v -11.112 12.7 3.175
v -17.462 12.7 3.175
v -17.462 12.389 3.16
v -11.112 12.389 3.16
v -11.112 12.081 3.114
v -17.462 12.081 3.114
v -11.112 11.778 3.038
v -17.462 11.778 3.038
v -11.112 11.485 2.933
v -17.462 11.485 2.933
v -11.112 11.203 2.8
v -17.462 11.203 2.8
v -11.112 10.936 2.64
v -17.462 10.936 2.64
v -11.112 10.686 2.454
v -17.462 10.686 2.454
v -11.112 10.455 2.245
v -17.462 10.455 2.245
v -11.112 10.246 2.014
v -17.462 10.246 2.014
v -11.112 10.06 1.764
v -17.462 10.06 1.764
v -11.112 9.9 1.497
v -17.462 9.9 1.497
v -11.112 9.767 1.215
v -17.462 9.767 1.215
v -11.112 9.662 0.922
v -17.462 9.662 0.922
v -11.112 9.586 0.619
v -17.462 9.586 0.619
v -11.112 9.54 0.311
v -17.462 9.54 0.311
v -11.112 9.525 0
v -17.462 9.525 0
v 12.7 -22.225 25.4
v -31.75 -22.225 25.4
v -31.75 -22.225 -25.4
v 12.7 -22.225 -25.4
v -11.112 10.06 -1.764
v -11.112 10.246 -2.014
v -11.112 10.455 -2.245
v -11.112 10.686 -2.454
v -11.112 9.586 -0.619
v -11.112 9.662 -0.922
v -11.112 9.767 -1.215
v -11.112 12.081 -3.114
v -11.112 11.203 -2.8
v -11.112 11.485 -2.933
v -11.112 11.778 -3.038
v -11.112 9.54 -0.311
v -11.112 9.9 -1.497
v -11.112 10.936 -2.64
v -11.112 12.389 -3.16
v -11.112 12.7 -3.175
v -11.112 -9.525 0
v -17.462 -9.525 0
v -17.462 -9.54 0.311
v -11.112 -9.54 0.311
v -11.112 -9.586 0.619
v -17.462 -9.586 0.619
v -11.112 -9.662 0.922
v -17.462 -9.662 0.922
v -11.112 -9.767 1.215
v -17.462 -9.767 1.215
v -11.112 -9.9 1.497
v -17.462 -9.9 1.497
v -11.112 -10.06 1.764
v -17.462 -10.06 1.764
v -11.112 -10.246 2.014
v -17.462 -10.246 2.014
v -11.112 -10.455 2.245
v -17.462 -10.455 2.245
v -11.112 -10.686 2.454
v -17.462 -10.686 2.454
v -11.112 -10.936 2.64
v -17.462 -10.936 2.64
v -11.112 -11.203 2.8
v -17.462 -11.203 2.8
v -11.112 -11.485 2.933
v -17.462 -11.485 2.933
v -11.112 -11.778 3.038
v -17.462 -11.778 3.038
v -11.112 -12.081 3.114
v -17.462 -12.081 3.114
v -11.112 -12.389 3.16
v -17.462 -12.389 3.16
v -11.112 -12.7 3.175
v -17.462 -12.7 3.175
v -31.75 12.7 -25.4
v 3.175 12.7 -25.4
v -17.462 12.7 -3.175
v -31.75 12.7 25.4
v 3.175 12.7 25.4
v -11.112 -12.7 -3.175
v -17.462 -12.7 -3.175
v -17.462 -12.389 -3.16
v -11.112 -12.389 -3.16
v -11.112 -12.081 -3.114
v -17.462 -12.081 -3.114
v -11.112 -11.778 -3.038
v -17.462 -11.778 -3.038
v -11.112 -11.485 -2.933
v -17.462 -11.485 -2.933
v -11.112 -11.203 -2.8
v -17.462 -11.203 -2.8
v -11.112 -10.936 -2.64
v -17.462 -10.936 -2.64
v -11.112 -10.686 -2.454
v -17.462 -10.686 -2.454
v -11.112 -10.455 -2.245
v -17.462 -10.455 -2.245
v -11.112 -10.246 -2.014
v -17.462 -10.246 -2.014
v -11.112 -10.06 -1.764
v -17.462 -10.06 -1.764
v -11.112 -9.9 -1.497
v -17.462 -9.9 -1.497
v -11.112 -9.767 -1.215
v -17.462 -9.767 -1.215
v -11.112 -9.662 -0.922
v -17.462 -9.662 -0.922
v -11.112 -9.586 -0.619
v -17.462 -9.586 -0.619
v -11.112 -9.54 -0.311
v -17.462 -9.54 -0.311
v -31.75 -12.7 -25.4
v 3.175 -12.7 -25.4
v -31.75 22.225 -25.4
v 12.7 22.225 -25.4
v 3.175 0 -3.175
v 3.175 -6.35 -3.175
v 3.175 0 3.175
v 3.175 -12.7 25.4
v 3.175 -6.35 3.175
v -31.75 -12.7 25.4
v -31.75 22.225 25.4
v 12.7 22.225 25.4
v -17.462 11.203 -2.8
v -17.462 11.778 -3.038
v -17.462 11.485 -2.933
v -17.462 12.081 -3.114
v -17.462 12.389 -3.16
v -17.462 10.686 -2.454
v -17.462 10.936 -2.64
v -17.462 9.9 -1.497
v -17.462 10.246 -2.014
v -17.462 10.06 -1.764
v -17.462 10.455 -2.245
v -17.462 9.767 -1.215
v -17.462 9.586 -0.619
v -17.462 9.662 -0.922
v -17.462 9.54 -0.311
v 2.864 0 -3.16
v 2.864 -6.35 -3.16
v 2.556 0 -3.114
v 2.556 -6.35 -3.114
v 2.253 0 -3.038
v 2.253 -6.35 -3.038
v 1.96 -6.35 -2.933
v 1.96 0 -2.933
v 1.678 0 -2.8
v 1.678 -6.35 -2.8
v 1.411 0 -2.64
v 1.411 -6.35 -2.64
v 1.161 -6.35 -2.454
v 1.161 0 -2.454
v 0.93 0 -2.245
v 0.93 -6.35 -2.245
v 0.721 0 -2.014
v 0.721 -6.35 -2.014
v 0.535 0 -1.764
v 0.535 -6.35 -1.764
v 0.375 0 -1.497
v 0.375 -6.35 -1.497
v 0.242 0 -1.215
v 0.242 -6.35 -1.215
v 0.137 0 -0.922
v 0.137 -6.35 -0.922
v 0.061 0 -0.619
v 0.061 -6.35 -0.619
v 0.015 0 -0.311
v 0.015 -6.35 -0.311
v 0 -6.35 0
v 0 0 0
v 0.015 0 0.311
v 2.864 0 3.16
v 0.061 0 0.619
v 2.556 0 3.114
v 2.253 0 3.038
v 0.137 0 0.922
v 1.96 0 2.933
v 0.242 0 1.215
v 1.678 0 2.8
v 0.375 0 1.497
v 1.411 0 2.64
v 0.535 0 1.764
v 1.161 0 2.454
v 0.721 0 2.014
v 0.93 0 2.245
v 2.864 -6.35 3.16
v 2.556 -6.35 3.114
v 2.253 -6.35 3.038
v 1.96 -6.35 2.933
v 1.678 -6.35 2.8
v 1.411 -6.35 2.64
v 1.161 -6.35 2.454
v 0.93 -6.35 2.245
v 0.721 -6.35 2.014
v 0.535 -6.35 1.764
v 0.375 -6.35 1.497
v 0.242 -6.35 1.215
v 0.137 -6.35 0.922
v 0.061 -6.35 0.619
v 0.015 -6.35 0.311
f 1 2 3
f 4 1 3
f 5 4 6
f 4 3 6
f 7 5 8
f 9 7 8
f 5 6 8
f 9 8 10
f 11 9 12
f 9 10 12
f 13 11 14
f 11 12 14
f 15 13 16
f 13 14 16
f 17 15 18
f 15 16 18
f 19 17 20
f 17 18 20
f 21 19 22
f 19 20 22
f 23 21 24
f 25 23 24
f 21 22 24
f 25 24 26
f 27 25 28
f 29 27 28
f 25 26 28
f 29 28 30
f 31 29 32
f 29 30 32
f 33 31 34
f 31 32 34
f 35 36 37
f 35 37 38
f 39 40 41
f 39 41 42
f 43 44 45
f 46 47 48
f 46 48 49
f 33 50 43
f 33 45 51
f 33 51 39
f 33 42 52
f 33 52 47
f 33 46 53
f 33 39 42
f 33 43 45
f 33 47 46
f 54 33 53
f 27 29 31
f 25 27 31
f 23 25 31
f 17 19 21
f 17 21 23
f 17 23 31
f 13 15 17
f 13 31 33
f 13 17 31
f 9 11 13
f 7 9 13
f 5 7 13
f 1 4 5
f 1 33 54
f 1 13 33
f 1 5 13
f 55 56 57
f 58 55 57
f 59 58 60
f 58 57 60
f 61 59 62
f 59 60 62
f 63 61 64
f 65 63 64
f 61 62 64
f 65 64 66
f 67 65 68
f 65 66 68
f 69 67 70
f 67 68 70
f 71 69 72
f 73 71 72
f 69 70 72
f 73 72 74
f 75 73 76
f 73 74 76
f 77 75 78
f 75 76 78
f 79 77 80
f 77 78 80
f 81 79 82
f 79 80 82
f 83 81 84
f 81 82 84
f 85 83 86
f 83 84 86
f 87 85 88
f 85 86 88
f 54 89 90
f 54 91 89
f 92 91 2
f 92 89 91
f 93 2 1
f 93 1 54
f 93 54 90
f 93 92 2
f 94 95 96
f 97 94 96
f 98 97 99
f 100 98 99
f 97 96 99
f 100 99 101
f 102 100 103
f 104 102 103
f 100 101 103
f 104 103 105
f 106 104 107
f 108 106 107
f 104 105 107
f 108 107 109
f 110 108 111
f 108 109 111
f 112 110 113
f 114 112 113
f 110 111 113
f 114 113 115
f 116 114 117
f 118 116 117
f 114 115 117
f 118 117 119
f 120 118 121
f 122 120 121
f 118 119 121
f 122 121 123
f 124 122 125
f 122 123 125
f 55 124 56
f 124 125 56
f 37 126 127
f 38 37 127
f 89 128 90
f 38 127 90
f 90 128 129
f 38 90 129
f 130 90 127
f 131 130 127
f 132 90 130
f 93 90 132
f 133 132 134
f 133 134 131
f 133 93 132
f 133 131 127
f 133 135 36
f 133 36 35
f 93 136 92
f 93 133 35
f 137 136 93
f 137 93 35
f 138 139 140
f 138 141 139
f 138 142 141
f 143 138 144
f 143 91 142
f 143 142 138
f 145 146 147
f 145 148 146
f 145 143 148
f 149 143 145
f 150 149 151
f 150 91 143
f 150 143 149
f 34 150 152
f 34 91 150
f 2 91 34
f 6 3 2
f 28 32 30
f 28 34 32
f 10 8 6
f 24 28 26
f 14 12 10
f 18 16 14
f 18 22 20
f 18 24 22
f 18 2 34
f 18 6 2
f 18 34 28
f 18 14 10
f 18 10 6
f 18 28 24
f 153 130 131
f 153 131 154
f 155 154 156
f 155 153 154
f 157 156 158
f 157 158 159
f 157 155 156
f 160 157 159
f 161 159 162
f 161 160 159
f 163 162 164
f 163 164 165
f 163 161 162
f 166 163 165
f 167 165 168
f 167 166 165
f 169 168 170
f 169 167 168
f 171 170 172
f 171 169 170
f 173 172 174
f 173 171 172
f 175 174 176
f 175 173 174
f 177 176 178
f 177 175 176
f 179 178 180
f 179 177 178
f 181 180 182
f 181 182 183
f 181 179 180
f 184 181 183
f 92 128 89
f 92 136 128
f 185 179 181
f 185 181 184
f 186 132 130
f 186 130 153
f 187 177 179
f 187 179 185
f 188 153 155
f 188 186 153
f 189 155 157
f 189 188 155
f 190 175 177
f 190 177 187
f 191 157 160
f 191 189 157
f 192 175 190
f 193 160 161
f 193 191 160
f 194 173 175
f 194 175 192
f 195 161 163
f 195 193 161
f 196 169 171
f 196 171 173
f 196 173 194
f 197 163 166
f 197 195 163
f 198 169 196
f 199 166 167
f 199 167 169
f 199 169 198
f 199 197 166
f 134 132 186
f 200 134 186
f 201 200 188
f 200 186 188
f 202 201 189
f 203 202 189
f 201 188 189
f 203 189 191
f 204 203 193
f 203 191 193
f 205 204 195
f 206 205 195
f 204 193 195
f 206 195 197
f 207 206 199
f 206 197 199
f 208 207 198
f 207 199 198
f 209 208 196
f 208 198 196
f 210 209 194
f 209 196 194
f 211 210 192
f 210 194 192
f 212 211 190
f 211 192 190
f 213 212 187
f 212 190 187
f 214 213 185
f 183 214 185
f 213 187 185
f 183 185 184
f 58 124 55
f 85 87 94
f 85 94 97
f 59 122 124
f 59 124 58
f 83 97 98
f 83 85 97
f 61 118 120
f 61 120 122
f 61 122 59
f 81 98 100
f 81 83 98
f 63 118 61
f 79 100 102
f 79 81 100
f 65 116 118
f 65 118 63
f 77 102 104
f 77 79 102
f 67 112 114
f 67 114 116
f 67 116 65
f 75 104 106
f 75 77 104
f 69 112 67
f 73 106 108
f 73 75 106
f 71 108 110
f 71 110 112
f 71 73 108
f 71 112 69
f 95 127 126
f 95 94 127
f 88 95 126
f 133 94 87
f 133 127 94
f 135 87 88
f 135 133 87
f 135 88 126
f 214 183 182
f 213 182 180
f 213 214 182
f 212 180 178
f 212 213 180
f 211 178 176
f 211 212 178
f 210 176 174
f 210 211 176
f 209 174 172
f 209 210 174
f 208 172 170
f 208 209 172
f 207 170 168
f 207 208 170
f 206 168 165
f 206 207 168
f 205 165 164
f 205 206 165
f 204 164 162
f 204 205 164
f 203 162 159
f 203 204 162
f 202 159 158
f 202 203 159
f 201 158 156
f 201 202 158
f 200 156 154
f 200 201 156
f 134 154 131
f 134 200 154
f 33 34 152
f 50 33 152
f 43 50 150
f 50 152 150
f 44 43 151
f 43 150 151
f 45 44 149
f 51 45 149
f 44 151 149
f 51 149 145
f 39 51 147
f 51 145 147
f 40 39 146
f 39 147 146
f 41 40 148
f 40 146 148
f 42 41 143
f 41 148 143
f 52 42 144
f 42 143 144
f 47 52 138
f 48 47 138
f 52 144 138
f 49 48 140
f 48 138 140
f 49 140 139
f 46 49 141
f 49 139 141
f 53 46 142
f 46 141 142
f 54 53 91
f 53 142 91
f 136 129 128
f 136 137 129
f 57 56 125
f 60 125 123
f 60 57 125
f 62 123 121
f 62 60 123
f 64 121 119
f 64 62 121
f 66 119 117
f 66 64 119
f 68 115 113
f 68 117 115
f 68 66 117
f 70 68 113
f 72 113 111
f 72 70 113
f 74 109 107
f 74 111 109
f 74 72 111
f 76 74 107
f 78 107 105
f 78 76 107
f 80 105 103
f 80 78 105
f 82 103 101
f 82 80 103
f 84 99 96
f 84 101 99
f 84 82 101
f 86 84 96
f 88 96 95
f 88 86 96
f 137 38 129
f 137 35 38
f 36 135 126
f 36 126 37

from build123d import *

# Parameters (mm, degrees)
BOSS_EXTRUDE1_DEPTH = 25.4
CUT_EXTRUDE1_DEPTH  = 6.35
CUT_EXTRUDE2_DEPTH  = 6.35


with BuildPart() as part:
    # Sketch1 → Boss-Extrude1 (new body, symmetric)
    with BuildSketch(Plane.XY):
        Polygon((-31.75, 22.225), (-31.75, 12.7), (-17.4625, 12.7), (-17.4625, 9.525), (-11.1125, 9.525), (-11.1125, 12.7), (3.175, 12.7), (3.175, 0), (0, 0), (0, -6.35), (3.175, -6.35), (3.175, -12.7), (-11.1125, -12.7), (-11.1125, -9.525), (-17.4625, -9.525), (-17.4625, -12.7), (-31.75, -12.7), (-31.75, -22.225), (12.7, -22.225), (12.7, 22.225), align=None)
    extrude(amount=BOSS_EXTRUDE1_DEPTH, both=True)

    # Sketch2 → Cut-Extrude1 (cut)
    with BuildSketch(Plane.ZY.offset(17.4625)):
        with BuildLine():
            ThreePointArc((3.175, 12.7), (2.245064024, 10.454935963), (-1.9e-08, 9.525))
            Line((-1.9e-08, 9.525), (25.4, 9.525))
            Line((25.4, 9.525), (25.4, 12.7))
            Line((25.4, 12.7), (3.175, 12.7))
        make_face()
        with BuildLine():
            Line((-3.175, 12.7), (-25.4, 12.7))
            Line((-25.4, 12.7), (-25.4, 9.525))
            Line((-25.4, 9.525), (-1.9e-08, 9.525))
            ThreePointArc((-1.9e-08, 9.525), (-2.245064037, 10.454935976), (-3.175, 12.7))
        make_face()
        with BuildLine():
            Line((-2e-09, -9.525), (-25.4, -9.525))
            Line((-25.4, -9.525), (-25.4, -12.7))
            Line((-25.4, -12.7), (-3.175, -12.7))
            ThreePointArc((-3.175, -12.7), (-2.245064031, -10.454935971), (-2e-09, -9.525))
        make_face()
        with BuildLine():
            Line((25.4, -9.525), (-2e-09, -9.525))
            ThreePointArc((-2e-09, -9.525), (2.245064029, -10.454935969), (3.175, -12.7))
            Line((3.175, -12.7), (25.4, -12.7))
            Line((25.4, -12.7), (25.4, -9.525))
        make_face()
    extrude(amount=-CUT_EXTRUDE1_DEPTH, mode=Mode.SUBTRACT)

    # Sketch3 → Cut-Extrude2 (cut)
    with BuildSketch(Plane(origin=(0, 0, 0), x_dir=(1, 0, 0), z_dir=(0, 1, 0))):
        with BuildLine():
            Line((0, 0), (0, -25.4))
            Line((0, -25.4), (3.175, -25.4))
            Line((3.175, -25.4), (3.175, -3.175))
            ThreePointArc((3.175, -3.175), (0.92993597, -2.24506403), (0, 0))
        make_face()
    cut_extrude2 = extrude(amount=-CUT_EXTRUDE2_DEPTH, mode=Mode.SUBTRACT)

    # Mirror1: Cut-Extrude2 across plane
    add(cut_extrude2.mirror(Plane.XY), mode=Mode.SUBTRACT)


solid = part.part
